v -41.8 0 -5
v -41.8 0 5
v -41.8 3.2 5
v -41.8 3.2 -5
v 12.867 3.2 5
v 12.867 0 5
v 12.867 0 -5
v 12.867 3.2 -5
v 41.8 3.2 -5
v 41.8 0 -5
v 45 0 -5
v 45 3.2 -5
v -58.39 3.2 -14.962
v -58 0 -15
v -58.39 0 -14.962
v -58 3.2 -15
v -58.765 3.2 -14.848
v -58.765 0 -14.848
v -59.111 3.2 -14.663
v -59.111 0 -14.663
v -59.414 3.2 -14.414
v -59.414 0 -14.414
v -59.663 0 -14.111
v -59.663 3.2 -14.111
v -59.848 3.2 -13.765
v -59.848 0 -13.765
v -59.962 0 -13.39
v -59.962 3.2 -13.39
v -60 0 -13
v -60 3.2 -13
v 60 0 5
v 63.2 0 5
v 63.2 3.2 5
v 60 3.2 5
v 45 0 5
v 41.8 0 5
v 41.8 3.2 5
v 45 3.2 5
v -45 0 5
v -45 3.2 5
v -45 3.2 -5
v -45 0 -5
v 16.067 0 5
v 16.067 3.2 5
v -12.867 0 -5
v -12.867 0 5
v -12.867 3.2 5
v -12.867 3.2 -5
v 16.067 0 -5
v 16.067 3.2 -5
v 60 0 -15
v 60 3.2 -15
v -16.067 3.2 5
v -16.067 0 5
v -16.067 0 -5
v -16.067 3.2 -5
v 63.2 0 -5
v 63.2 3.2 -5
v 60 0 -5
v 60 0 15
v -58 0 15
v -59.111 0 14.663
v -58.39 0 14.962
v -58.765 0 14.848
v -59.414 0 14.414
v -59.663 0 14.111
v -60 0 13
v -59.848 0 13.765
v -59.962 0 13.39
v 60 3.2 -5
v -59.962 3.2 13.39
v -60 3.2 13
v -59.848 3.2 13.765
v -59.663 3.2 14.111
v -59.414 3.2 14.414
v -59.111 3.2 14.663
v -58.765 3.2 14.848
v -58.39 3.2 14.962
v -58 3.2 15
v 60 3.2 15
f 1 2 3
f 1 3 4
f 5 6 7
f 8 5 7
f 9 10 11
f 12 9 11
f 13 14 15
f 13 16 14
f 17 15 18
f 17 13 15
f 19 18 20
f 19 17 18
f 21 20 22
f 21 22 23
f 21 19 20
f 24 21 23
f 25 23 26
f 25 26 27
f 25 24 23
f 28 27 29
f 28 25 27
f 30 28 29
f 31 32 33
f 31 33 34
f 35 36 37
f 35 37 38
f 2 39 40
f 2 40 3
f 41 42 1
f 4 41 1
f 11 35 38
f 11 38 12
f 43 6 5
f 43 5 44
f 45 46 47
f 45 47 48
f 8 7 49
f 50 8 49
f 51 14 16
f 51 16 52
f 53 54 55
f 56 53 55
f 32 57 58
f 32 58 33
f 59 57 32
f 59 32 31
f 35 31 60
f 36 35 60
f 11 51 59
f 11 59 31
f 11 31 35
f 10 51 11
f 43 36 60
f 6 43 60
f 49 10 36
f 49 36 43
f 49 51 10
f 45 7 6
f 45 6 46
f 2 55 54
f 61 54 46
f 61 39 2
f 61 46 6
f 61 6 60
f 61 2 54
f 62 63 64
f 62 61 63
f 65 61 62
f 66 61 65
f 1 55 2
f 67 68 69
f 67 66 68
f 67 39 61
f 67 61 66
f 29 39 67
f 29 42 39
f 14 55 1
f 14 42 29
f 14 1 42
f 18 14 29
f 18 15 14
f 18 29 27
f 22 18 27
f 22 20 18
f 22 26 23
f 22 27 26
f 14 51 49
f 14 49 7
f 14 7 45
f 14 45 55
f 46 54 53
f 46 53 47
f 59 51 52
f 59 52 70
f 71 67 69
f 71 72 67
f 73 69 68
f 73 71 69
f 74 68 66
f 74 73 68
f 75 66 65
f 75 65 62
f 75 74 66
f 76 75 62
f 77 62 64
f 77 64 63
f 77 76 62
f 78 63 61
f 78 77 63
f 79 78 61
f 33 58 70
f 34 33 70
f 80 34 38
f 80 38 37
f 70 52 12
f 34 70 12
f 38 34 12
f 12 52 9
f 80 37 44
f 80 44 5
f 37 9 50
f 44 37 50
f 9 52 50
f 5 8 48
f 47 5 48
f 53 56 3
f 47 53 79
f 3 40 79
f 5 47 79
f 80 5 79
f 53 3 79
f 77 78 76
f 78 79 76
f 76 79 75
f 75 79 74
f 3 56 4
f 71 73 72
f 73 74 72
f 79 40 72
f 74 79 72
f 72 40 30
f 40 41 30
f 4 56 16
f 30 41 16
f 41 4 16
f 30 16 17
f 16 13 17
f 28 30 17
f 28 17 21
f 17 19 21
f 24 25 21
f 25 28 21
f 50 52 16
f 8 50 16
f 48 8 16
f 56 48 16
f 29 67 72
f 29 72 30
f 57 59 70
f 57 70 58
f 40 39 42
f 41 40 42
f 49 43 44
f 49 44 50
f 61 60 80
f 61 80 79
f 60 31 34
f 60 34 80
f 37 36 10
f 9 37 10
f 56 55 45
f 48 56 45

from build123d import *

# Parameters (mm, degrees)
BASE_SKETCH_W       = 3.2
BASE_SKETCH_H       = 10
BOSS_EXTRUDE1_DEPTH = 3.2
FILLET1_R           = 2


with BuildPart() as part:
    # Base_Sketch → Boss-Extrude1 (new body)
    with BuildSketch(Plane(origin=(0, 0, 0), x_dir=(1, 0, 0), z_dir=(0, 1, 0))):
        Polygon((-60, 15), (60, 15), (60, 5), (63.2, 5), (63.2, -5), (60, -5), (60, -15), (-60, -15), align=None)
        with Locations((-14.466666667, 0)):
            Rectangle(BASE_SKETCH_W, BASE_SKETCH_H, mode=Mode.SUBTRACT)
        with Locations((-43.4, 0)):
            Rectangle(BASE_SKETCH_W, BASE_SKETCH_H, mode=Mode.SUBTRACT)
        with Locations((14.466666667, 0)):
            Rectangle(BASE_SKETCH_W, BASE_SKETCH_H, mode=Mode.SUBTRACT)
        with Locations((43.4, 0)):
            Rectangle(BASE_SKETCH_W, BASE_SKETCH_H, mode=Mode.SUBTRACT)
    extrude(amount=BOSS_EXTRUDE1_DEPTH)

    # Fillet1
    fillet1_edges = [part.edges().sort_by_distance(p)[0] for p in [
        (-60, 1.6, 15),
        (-60, 1.6, -15),
    ]]
    fillet(fillet1_edges, radius=FILLET1_R)


solid = part.part
